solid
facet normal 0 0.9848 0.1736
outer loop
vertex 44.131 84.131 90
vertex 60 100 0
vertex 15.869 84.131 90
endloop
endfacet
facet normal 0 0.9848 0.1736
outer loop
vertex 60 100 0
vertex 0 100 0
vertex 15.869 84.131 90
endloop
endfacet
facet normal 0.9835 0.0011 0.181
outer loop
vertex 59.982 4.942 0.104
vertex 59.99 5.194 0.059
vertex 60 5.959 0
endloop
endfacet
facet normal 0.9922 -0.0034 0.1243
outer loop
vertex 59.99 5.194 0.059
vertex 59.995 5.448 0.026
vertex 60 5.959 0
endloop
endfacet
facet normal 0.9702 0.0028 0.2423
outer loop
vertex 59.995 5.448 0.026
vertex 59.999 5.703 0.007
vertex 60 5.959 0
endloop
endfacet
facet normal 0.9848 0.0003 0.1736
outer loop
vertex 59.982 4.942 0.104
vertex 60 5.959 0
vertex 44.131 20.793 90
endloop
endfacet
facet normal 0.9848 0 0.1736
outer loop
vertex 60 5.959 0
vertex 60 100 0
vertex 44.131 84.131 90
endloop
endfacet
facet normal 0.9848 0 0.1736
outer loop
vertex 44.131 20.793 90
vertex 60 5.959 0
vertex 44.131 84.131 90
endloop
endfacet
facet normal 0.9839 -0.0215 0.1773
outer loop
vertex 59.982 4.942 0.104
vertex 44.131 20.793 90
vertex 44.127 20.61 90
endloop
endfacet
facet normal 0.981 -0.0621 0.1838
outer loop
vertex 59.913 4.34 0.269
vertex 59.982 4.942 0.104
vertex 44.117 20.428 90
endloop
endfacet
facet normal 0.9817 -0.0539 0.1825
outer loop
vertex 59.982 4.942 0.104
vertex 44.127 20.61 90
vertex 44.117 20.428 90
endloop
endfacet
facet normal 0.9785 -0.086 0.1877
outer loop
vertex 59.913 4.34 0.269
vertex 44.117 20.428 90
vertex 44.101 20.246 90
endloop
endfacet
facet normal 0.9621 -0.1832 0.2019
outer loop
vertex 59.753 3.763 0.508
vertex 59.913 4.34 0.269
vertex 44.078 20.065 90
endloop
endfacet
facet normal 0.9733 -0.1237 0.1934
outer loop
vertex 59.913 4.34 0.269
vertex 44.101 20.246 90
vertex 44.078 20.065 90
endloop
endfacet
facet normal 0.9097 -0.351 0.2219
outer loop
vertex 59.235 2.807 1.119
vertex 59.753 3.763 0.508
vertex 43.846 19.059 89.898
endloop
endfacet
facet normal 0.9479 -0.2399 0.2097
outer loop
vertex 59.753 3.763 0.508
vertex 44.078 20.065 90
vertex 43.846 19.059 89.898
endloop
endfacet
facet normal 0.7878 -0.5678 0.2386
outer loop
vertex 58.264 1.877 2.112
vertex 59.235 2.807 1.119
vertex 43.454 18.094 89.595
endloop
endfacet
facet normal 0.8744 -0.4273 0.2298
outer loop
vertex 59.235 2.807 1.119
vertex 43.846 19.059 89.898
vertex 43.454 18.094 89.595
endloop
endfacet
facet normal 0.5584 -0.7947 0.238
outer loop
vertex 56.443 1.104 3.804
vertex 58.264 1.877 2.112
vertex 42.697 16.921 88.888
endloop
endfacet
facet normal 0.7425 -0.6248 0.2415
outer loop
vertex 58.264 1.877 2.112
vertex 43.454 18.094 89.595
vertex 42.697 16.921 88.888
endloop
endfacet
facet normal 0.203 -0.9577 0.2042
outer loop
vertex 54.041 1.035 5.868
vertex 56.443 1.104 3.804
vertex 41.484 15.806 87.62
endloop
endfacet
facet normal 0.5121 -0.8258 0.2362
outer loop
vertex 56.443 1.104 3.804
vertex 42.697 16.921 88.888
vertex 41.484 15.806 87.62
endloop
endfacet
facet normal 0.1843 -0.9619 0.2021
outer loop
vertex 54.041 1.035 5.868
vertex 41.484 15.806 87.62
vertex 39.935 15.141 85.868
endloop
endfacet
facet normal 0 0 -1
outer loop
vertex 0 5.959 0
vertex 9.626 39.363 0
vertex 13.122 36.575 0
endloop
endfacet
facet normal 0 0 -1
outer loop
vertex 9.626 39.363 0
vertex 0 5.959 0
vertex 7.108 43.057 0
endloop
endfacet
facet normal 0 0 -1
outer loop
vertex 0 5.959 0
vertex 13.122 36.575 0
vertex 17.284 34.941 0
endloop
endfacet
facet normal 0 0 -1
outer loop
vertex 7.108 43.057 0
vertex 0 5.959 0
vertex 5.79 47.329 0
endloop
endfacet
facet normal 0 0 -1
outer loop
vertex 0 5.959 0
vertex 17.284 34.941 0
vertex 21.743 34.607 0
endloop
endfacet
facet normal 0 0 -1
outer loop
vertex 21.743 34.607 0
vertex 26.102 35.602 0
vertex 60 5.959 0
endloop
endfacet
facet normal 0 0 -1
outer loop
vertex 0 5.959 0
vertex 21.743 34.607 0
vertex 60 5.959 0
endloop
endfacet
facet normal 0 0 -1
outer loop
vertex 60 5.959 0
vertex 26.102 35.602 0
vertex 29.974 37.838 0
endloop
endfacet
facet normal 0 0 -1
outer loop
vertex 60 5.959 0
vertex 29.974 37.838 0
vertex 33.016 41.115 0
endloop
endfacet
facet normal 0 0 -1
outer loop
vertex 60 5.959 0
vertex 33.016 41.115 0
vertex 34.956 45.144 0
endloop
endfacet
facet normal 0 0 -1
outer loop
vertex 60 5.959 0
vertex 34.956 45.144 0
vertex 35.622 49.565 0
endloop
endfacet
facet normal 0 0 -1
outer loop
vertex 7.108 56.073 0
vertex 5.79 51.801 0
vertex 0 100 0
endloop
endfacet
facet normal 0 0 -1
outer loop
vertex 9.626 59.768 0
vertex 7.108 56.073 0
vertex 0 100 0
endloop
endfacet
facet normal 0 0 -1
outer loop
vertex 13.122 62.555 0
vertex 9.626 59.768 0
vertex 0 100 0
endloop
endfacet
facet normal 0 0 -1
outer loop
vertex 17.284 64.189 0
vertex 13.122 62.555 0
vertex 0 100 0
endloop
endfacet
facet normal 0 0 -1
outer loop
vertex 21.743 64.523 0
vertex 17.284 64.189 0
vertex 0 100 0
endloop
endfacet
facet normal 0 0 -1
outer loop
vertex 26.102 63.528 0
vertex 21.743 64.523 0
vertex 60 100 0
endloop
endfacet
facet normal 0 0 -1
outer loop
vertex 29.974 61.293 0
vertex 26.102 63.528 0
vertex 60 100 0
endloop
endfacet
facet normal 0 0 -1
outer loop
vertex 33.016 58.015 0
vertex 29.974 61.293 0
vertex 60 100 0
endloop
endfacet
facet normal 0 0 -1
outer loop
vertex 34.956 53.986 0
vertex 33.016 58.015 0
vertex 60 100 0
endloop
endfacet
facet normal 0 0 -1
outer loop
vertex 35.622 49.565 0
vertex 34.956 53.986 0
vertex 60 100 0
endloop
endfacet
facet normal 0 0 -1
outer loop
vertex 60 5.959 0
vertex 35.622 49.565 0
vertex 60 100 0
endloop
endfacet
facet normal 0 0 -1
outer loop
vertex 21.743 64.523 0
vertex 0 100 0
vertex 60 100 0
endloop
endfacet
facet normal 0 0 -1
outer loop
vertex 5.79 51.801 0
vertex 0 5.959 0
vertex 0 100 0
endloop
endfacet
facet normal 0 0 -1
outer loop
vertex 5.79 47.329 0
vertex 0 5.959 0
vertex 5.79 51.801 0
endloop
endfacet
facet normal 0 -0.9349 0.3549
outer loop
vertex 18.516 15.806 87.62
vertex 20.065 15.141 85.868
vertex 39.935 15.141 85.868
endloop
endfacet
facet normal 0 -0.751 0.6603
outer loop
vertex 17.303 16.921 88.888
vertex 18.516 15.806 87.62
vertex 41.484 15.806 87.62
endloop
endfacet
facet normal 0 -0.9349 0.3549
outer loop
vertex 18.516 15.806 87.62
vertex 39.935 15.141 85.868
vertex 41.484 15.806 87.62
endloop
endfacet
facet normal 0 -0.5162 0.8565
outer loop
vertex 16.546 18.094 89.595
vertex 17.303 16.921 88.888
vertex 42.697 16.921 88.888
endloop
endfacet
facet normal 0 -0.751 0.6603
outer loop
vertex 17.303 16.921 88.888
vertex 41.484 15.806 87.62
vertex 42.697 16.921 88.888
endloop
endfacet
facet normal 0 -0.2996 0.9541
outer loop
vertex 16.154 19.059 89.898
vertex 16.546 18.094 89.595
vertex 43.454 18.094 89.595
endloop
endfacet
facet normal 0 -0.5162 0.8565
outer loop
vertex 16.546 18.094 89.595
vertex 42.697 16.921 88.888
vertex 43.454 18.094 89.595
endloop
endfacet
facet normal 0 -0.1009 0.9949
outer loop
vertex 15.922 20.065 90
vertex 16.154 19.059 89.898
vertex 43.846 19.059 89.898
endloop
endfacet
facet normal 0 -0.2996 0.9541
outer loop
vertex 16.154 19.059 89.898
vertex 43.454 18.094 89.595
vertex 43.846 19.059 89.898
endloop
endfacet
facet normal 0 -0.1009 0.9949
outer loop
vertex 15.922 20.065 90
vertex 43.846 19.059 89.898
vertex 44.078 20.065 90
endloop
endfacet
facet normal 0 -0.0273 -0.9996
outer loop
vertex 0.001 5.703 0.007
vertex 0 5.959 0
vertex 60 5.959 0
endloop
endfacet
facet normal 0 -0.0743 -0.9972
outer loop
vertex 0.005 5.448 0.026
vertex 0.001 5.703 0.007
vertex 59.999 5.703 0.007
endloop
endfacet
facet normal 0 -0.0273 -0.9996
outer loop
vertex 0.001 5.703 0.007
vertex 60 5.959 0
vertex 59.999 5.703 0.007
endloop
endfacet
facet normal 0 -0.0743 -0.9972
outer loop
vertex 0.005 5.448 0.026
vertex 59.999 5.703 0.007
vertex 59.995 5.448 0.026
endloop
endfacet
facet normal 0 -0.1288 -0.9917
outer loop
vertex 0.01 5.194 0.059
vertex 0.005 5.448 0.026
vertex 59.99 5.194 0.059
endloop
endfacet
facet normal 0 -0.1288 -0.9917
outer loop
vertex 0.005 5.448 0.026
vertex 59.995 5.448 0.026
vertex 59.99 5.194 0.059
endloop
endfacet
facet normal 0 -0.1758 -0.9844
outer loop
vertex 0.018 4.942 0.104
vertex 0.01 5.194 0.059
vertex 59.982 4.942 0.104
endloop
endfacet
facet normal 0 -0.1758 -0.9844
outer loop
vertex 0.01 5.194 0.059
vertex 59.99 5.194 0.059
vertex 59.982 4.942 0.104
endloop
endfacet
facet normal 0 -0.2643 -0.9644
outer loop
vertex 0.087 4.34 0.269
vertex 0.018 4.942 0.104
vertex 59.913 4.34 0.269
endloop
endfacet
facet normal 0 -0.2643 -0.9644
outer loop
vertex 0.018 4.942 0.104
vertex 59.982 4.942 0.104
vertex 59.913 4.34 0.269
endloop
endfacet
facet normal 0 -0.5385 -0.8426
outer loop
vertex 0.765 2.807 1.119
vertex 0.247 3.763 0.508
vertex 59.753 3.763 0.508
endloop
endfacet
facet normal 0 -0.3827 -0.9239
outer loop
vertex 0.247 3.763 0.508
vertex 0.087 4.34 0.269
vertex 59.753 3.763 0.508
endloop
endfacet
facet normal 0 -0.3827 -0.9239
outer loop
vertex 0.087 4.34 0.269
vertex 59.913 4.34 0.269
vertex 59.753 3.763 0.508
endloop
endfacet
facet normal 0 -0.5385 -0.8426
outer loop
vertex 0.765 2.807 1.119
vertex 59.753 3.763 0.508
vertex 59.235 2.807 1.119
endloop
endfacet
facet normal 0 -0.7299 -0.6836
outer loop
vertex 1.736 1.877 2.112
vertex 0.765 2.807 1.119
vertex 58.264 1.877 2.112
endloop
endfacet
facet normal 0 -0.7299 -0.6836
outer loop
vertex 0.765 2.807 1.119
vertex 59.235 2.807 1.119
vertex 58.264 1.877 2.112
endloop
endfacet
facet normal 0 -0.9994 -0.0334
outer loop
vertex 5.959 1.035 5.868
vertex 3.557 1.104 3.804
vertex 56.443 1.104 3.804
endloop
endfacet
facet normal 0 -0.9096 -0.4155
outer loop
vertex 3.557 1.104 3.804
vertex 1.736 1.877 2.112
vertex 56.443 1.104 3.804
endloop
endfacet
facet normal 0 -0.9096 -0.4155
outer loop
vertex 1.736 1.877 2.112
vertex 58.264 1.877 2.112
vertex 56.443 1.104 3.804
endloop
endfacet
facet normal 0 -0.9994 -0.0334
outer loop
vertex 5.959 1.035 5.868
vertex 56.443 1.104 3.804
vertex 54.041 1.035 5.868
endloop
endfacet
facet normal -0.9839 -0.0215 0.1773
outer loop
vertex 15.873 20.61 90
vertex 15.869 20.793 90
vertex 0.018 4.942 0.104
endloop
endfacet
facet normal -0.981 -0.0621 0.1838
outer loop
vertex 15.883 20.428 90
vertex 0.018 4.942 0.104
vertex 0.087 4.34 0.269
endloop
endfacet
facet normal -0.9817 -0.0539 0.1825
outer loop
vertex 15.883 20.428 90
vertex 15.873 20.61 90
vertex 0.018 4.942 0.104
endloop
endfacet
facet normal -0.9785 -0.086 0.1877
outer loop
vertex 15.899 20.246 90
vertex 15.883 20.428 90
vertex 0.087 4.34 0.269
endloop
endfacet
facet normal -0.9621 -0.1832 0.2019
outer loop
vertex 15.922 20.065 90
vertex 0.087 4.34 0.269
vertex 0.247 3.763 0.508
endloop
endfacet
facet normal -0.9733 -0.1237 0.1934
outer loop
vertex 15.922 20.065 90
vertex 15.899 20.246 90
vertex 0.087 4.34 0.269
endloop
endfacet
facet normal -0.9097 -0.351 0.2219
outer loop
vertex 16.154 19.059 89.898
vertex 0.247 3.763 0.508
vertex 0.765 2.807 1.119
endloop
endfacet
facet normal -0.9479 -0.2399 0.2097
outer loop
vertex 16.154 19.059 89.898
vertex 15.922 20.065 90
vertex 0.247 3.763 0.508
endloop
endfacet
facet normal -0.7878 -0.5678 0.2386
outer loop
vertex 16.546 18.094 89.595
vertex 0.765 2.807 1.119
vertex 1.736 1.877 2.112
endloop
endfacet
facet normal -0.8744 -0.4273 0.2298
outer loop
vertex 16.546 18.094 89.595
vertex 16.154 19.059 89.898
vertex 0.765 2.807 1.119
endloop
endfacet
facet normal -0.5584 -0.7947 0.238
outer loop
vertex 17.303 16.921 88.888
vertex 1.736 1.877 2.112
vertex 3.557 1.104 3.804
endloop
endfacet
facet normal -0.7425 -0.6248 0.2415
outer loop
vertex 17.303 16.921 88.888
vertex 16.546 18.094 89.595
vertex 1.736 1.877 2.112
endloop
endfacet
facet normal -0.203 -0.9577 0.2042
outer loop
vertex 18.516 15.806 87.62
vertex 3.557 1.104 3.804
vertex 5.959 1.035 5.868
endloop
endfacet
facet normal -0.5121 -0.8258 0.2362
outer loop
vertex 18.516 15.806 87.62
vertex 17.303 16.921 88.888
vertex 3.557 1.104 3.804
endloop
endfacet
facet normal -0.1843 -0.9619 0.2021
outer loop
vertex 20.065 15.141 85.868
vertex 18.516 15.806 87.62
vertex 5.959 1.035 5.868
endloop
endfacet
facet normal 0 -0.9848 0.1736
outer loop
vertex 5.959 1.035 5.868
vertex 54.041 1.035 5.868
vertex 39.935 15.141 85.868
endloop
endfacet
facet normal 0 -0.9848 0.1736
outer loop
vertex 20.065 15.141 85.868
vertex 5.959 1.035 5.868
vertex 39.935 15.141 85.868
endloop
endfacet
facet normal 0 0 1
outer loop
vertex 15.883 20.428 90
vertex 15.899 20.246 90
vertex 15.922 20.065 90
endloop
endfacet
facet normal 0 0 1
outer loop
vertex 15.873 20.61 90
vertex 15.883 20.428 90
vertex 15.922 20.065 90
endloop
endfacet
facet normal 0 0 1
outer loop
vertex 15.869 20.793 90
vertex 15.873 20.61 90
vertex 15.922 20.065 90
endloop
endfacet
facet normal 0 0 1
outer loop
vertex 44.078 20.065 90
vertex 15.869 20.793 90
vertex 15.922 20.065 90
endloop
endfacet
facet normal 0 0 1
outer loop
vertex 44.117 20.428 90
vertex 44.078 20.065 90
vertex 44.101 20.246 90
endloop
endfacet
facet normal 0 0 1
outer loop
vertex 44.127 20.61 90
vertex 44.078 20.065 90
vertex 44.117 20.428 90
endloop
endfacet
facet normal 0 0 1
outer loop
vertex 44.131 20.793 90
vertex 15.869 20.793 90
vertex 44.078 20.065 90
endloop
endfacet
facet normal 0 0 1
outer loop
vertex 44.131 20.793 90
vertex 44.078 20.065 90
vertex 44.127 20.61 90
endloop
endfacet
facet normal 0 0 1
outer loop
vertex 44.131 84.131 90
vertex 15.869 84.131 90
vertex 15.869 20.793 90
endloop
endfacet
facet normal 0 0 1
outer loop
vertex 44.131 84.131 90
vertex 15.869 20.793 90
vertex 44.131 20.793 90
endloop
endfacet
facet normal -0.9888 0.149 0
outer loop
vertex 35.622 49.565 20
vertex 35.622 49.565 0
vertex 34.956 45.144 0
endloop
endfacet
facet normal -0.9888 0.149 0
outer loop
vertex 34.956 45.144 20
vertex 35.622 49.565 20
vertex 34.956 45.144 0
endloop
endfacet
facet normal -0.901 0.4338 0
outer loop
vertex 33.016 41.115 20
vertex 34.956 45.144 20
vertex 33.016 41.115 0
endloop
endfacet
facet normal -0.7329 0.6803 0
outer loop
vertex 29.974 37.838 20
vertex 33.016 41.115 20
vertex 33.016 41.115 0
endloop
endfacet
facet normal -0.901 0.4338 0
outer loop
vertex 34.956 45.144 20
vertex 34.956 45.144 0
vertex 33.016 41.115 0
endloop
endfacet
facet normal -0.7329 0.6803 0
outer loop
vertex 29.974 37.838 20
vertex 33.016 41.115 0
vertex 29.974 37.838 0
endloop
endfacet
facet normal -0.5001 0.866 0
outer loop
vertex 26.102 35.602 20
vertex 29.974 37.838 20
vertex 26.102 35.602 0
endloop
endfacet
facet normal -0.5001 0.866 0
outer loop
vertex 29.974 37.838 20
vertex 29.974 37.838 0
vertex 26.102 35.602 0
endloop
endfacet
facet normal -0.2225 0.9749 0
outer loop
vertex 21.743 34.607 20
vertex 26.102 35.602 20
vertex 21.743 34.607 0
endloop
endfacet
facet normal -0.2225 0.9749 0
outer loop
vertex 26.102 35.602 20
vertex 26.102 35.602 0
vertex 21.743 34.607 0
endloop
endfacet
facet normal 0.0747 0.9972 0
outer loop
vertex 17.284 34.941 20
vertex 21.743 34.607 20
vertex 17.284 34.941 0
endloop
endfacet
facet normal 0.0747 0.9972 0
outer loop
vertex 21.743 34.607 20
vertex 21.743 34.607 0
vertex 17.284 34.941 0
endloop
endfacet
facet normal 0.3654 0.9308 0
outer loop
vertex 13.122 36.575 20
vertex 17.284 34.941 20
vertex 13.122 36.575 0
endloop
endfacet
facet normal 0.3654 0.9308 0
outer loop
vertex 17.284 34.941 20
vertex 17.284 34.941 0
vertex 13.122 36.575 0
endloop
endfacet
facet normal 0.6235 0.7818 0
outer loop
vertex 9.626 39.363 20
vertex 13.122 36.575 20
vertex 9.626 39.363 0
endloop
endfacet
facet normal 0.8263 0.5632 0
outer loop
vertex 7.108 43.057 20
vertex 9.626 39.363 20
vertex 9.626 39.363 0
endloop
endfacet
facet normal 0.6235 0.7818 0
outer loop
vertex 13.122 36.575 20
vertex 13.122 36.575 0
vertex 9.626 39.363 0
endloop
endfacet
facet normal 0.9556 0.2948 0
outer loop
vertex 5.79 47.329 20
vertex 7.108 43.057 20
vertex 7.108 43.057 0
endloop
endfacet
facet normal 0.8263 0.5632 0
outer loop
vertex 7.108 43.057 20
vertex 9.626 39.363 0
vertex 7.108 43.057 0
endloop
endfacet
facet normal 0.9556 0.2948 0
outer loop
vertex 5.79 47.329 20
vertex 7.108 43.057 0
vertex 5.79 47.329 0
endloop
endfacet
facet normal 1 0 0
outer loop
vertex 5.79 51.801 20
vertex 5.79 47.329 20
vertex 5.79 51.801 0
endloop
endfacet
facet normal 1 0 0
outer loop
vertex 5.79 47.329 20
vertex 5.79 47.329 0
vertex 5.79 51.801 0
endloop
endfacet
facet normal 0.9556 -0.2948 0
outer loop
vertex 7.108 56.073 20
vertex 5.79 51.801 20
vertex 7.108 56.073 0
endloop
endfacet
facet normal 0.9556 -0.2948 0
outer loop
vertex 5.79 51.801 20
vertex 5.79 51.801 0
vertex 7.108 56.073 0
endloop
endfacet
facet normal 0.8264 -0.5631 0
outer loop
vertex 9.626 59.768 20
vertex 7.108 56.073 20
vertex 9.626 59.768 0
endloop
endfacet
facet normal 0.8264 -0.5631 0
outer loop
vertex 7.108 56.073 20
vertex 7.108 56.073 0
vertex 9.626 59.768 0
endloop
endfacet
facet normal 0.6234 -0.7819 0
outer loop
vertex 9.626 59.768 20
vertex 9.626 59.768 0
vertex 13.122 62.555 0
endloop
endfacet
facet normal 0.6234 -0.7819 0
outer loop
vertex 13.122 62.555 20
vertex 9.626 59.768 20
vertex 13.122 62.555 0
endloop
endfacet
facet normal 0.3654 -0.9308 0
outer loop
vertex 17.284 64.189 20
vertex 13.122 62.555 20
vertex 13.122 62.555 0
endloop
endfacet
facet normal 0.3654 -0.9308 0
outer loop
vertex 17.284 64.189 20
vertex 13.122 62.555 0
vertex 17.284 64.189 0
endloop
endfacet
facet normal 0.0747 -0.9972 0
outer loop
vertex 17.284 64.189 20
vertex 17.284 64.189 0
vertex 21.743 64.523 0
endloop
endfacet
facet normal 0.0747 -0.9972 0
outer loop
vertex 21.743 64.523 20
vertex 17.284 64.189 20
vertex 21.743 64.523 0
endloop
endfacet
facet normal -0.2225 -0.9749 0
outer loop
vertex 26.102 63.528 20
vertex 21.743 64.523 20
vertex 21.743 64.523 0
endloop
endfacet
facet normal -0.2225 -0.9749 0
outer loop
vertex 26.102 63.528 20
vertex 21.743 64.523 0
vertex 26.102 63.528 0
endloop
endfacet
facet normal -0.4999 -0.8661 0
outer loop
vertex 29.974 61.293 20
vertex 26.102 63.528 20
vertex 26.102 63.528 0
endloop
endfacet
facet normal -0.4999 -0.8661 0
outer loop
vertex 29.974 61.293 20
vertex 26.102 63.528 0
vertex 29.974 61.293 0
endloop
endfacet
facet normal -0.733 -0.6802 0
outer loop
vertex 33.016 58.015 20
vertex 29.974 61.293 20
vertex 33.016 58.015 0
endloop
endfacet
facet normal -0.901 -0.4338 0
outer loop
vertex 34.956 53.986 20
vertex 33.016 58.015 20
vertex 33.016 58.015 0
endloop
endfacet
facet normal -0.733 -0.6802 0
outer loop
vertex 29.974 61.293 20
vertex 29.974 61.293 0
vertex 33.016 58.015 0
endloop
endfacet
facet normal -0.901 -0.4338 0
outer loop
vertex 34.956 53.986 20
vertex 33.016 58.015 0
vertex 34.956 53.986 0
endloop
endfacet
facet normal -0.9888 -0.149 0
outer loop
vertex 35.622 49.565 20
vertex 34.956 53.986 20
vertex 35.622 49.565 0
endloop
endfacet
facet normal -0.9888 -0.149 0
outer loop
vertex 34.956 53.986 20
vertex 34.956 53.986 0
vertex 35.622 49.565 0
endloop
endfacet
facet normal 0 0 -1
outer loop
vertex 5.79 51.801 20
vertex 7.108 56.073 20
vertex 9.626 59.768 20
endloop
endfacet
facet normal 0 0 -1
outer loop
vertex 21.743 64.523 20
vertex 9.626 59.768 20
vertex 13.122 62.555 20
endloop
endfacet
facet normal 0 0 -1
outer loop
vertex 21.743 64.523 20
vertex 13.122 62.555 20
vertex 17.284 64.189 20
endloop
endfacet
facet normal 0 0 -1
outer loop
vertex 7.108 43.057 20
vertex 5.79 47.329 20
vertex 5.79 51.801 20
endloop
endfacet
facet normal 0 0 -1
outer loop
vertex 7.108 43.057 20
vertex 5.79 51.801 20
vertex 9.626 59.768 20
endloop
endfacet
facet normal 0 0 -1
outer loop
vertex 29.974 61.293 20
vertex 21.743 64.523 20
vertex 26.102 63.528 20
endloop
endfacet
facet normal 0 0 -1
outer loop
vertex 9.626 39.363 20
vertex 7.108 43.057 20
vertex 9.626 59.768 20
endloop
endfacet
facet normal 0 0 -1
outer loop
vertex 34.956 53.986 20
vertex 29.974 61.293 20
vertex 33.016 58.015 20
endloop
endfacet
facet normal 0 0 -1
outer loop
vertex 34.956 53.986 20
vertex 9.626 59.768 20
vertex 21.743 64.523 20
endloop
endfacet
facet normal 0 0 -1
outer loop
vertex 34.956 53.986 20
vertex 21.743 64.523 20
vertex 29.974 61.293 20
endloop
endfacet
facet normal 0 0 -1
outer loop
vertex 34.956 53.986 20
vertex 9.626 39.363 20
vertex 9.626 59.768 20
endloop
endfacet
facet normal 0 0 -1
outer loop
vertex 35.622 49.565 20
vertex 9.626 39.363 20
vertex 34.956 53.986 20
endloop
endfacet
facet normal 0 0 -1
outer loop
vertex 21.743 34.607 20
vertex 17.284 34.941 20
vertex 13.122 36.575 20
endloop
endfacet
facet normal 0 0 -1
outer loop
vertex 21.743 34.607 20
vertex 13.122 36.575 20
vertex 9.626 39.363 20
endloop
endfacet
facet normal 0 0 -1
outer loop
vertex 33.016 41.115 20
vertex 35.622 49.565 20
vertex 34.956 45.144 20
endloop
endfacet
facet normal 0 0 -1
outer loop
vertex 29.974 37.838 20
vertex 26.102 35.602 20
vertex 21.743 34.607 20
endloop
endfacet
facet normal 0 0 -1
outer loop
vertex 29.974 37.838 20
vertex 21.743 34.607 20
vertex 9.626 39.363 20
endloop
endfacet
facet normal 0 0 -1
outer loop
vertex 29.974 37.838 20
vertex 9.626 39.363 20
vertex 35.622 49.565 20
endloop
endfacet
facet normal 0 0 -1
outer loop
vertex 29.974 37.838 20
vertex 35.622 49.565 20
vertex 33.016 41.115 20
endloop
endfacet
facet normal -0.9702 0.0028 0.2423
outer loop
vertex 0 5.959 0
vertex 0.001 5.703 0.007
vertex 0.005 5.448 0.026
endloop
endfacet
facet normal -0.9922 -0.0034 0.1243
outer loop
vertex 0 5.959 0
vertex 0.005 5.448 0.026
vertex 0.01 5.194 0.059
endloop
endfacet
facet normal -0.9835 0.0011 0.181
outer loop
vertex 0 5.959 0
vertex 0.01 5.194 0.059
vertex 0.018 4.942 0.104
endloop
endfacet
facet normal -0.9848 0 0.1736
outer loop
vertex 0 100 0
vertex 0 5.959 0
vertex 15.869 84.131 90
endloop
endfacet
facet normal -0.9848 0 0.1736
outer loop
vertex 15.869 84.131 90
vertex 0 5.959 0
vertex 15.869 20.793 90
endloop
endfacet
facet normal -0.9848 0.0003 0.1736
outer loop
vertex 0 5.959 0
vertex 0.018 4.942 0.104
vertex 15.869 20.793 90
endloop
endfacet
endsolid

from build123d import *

# Parameters (mm, degrees)
F3_W     = 60
F3_H     = 100
F0_DEPTH = 90.0000035763
F0_TAPER = 10
F1_R     = 5
F2_R     = 15
F4_DEPTH = 20


with BuildPart() as f0:
    # F3 (on Top) → F0 (new body)
    with BuildSketch(Plane.XY):
        with Locations((30, 50)):
            Rectangle(F3_W, F3_H)
    extrude(amount=F0_DEPTH, taper=F0_TAPER)

    # F1
    f1_edges = [f0.edges().sort_by_distance(p)[0] for p in [
        (52.065286, 7.934714, 45.000002),
        (7.934714, 7.934714, 45.000002),
        (30, 0, 0),
        (30, 15.869429, 90.000004),
    ]]
    fillet(f1_edges, radius=F1_R)

    # F2 (on face) → F4 (cut)
    with BuildSketch(Plane(origin=(0, 0, 0), x_dir=(1, 0, 0), z_dir=(0, 0, -1))):
        with Locations((20.6221230328, -49.5650991797)):
            Circle(F2_R)
    extrude(amount=-F4_DEPTH, mode=Mode.SUBTRACT)


solid = f0.part
